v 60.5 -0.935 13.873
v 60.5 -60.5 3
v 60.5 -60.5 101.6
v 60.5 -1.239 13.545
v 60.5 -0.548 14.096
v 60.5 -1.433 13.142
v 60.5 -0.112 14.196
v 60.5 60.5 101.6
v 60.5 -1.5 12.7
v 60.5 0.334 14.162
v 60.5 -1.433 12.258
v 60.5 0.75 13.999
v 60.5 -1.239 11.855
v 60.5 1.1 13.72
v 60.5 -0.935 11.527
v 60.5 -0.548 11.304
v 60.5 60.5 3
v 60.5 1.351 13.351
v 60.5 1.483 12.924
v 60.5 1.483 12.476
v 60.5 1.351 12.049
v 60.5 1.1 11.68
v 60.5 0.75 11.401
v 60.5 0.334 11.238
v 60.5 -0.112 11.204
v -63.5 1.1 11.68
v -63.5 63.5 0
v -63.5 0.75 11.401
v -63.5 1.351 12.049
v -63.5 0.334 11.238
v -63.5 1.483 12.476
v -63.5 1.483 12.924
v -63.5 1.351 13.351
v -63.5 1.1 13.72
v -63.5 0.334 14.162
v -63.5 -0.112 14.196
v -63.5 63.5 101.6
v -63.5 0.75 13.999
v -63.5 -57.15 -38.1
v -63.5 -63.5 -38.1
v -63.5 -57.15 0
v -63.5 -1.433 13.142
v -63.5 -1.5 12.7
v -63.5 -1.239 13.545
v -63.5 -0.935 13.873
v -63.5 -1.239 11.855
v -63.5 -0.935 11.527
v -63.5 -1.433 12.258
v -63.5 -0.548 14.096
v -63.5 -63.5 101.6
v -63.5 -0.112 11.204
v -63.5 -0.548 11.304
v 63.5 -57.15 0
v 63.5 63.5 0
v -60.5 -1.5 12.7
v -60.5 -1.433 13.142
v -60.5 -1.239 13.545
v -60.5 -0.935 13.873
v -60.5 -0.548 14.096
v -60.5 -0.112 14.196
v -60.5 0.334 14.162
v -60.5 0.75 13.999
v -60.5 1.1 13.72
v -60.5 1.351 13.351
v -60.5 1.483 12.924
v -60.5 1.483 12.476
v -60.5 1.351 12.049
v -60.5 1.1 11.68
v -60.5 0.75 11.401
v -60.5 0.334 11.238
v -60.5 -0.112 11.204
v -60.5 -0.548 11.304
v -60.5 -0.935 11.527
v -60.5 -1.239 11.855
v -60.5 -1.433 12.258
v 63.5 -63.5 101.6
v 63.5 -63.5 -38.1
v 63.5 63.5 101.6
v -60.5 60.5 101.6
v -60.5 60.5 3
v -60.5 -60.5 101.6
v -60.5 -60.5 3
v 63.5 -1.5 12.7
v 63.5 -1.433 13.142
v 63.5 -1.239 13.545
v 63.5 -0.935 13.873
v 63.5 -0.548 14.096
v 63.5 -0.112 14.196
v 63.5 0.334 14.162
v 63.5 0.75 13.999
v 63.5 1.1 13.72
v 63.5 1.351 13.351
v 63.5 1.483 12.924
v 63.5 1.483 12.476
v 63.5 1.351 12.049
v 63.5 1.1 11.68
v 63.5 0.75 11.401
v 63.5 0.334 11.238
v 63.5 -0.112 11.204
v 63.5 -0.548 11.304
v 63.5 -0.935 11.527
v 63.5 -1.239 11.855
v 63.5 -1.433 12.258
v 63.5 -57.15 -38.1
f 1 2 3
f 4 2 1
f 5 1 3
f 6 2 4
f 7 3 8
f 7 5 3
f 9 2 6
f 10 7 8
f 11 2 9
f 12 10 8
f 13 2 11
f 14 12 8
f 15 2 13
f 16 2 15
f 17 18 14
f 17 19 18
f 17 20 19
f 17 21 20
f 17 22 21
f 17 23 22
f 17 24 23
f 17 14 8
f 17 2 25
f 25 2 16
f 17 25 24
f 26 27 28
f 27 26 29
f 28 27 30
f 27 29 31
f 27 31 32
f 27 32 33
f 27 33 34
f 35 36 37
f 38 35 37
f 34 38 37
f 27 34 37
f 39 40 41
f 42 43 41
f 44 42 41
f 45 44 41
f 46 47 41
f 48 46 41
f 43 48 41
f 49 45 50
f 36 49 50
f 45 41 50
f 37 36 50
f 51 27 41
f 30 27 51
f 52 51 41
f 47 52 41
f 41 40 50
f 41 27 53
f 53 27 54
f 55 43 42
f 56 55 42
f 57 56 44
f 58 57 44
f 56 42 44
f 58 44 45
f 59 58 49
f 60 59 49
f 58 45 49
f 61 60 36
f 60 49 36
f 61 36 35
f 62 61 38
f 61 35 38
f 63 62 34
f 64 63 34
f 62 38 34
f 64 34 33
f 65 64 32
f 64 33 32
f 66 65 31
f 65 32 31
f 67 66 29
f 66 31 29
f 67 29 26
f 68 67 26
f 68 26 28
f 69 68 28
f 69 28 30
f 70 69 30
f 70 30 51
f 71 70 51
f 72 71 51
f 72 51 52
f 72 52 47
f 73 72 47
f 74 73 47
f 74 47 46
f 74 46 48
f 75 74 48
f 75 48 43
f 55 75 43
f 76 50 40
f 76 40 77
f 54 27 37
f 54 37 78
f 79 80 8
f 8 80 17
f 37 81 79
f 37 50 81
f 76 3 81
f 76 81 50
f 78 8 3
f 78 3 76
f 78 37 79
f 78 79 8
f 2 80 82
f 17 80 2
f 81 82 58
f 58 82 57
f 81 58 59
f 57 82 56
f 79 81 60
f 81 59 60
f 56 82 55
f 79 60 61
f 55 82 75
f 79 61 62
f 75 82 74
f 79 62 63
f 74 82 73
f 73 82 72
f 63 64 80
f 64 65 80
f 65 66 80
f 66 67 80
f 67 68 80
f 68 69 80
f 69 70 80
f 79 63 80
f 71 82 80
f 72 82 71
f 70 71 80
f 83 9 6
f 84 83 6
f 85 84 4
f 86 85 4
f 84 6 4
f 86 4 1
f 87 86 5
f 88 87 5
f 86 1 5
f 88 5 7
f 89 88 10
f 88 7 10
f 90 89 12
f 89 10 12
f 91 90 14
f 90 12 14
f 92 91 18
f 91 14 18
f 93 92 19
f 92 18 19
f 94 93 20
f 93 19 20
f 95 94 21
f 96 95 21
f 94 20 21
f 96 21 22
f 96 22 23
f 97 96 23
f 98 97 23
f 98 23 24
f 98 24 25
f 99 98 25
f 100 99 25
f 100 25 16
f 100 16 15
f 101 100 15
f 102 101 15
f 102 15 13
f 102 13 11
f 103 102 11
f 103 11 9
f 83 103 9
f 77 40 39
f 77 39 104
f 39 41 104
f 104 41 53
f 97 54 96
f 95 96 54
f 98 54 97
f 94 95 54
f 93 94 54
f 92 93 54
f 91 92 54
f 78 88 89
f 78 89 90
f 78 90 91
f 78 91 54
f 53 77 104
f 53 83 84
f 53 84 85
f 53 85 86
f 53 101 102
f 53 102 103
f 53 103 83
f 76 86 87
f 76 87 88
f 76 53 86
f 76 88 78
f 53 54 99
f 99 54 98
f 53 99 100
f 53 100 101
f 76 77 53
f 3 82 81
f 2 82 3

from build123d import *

# Parameters (mm, degrees)
F0_W     = 127
F0_H     = 127
F1_DEPTH = 101.6
F2_T     = -3
F4_W     = 127
F4_H     = 38.1
F5_DEPTH = 6.35
F6_D     = 3


with BuildPart() as f1:
    # F0 (on Top) → F1 (new body)
    with BuildSketch(Plane.XY):
        Rectangle(F0_W, F0_H)
    extrude(amount=F1_DEPTH)

    # F2
    f2_openings = [f1.faces().sort_by_distance(p)[0] for p in [
        (0, 0, 101.6),
    ]]
    offset(amount=F2_T, openings=f2_openings)

    # F4 (on face) → F5 (join)
    with BuildSketch(Plane.XZ.offset(63.5)):
        with Locations((0, -19.05)):
            Rectangle(F4_W, F4_H)
    extrude(amount=-F5_DEPTH)

    # F6 (through all)
    with Locations(Plane.YZ.offset(63.5)):
        with Locations((0, 12.7)):
            Hole(F6_D / 2)


solid = f1.part
